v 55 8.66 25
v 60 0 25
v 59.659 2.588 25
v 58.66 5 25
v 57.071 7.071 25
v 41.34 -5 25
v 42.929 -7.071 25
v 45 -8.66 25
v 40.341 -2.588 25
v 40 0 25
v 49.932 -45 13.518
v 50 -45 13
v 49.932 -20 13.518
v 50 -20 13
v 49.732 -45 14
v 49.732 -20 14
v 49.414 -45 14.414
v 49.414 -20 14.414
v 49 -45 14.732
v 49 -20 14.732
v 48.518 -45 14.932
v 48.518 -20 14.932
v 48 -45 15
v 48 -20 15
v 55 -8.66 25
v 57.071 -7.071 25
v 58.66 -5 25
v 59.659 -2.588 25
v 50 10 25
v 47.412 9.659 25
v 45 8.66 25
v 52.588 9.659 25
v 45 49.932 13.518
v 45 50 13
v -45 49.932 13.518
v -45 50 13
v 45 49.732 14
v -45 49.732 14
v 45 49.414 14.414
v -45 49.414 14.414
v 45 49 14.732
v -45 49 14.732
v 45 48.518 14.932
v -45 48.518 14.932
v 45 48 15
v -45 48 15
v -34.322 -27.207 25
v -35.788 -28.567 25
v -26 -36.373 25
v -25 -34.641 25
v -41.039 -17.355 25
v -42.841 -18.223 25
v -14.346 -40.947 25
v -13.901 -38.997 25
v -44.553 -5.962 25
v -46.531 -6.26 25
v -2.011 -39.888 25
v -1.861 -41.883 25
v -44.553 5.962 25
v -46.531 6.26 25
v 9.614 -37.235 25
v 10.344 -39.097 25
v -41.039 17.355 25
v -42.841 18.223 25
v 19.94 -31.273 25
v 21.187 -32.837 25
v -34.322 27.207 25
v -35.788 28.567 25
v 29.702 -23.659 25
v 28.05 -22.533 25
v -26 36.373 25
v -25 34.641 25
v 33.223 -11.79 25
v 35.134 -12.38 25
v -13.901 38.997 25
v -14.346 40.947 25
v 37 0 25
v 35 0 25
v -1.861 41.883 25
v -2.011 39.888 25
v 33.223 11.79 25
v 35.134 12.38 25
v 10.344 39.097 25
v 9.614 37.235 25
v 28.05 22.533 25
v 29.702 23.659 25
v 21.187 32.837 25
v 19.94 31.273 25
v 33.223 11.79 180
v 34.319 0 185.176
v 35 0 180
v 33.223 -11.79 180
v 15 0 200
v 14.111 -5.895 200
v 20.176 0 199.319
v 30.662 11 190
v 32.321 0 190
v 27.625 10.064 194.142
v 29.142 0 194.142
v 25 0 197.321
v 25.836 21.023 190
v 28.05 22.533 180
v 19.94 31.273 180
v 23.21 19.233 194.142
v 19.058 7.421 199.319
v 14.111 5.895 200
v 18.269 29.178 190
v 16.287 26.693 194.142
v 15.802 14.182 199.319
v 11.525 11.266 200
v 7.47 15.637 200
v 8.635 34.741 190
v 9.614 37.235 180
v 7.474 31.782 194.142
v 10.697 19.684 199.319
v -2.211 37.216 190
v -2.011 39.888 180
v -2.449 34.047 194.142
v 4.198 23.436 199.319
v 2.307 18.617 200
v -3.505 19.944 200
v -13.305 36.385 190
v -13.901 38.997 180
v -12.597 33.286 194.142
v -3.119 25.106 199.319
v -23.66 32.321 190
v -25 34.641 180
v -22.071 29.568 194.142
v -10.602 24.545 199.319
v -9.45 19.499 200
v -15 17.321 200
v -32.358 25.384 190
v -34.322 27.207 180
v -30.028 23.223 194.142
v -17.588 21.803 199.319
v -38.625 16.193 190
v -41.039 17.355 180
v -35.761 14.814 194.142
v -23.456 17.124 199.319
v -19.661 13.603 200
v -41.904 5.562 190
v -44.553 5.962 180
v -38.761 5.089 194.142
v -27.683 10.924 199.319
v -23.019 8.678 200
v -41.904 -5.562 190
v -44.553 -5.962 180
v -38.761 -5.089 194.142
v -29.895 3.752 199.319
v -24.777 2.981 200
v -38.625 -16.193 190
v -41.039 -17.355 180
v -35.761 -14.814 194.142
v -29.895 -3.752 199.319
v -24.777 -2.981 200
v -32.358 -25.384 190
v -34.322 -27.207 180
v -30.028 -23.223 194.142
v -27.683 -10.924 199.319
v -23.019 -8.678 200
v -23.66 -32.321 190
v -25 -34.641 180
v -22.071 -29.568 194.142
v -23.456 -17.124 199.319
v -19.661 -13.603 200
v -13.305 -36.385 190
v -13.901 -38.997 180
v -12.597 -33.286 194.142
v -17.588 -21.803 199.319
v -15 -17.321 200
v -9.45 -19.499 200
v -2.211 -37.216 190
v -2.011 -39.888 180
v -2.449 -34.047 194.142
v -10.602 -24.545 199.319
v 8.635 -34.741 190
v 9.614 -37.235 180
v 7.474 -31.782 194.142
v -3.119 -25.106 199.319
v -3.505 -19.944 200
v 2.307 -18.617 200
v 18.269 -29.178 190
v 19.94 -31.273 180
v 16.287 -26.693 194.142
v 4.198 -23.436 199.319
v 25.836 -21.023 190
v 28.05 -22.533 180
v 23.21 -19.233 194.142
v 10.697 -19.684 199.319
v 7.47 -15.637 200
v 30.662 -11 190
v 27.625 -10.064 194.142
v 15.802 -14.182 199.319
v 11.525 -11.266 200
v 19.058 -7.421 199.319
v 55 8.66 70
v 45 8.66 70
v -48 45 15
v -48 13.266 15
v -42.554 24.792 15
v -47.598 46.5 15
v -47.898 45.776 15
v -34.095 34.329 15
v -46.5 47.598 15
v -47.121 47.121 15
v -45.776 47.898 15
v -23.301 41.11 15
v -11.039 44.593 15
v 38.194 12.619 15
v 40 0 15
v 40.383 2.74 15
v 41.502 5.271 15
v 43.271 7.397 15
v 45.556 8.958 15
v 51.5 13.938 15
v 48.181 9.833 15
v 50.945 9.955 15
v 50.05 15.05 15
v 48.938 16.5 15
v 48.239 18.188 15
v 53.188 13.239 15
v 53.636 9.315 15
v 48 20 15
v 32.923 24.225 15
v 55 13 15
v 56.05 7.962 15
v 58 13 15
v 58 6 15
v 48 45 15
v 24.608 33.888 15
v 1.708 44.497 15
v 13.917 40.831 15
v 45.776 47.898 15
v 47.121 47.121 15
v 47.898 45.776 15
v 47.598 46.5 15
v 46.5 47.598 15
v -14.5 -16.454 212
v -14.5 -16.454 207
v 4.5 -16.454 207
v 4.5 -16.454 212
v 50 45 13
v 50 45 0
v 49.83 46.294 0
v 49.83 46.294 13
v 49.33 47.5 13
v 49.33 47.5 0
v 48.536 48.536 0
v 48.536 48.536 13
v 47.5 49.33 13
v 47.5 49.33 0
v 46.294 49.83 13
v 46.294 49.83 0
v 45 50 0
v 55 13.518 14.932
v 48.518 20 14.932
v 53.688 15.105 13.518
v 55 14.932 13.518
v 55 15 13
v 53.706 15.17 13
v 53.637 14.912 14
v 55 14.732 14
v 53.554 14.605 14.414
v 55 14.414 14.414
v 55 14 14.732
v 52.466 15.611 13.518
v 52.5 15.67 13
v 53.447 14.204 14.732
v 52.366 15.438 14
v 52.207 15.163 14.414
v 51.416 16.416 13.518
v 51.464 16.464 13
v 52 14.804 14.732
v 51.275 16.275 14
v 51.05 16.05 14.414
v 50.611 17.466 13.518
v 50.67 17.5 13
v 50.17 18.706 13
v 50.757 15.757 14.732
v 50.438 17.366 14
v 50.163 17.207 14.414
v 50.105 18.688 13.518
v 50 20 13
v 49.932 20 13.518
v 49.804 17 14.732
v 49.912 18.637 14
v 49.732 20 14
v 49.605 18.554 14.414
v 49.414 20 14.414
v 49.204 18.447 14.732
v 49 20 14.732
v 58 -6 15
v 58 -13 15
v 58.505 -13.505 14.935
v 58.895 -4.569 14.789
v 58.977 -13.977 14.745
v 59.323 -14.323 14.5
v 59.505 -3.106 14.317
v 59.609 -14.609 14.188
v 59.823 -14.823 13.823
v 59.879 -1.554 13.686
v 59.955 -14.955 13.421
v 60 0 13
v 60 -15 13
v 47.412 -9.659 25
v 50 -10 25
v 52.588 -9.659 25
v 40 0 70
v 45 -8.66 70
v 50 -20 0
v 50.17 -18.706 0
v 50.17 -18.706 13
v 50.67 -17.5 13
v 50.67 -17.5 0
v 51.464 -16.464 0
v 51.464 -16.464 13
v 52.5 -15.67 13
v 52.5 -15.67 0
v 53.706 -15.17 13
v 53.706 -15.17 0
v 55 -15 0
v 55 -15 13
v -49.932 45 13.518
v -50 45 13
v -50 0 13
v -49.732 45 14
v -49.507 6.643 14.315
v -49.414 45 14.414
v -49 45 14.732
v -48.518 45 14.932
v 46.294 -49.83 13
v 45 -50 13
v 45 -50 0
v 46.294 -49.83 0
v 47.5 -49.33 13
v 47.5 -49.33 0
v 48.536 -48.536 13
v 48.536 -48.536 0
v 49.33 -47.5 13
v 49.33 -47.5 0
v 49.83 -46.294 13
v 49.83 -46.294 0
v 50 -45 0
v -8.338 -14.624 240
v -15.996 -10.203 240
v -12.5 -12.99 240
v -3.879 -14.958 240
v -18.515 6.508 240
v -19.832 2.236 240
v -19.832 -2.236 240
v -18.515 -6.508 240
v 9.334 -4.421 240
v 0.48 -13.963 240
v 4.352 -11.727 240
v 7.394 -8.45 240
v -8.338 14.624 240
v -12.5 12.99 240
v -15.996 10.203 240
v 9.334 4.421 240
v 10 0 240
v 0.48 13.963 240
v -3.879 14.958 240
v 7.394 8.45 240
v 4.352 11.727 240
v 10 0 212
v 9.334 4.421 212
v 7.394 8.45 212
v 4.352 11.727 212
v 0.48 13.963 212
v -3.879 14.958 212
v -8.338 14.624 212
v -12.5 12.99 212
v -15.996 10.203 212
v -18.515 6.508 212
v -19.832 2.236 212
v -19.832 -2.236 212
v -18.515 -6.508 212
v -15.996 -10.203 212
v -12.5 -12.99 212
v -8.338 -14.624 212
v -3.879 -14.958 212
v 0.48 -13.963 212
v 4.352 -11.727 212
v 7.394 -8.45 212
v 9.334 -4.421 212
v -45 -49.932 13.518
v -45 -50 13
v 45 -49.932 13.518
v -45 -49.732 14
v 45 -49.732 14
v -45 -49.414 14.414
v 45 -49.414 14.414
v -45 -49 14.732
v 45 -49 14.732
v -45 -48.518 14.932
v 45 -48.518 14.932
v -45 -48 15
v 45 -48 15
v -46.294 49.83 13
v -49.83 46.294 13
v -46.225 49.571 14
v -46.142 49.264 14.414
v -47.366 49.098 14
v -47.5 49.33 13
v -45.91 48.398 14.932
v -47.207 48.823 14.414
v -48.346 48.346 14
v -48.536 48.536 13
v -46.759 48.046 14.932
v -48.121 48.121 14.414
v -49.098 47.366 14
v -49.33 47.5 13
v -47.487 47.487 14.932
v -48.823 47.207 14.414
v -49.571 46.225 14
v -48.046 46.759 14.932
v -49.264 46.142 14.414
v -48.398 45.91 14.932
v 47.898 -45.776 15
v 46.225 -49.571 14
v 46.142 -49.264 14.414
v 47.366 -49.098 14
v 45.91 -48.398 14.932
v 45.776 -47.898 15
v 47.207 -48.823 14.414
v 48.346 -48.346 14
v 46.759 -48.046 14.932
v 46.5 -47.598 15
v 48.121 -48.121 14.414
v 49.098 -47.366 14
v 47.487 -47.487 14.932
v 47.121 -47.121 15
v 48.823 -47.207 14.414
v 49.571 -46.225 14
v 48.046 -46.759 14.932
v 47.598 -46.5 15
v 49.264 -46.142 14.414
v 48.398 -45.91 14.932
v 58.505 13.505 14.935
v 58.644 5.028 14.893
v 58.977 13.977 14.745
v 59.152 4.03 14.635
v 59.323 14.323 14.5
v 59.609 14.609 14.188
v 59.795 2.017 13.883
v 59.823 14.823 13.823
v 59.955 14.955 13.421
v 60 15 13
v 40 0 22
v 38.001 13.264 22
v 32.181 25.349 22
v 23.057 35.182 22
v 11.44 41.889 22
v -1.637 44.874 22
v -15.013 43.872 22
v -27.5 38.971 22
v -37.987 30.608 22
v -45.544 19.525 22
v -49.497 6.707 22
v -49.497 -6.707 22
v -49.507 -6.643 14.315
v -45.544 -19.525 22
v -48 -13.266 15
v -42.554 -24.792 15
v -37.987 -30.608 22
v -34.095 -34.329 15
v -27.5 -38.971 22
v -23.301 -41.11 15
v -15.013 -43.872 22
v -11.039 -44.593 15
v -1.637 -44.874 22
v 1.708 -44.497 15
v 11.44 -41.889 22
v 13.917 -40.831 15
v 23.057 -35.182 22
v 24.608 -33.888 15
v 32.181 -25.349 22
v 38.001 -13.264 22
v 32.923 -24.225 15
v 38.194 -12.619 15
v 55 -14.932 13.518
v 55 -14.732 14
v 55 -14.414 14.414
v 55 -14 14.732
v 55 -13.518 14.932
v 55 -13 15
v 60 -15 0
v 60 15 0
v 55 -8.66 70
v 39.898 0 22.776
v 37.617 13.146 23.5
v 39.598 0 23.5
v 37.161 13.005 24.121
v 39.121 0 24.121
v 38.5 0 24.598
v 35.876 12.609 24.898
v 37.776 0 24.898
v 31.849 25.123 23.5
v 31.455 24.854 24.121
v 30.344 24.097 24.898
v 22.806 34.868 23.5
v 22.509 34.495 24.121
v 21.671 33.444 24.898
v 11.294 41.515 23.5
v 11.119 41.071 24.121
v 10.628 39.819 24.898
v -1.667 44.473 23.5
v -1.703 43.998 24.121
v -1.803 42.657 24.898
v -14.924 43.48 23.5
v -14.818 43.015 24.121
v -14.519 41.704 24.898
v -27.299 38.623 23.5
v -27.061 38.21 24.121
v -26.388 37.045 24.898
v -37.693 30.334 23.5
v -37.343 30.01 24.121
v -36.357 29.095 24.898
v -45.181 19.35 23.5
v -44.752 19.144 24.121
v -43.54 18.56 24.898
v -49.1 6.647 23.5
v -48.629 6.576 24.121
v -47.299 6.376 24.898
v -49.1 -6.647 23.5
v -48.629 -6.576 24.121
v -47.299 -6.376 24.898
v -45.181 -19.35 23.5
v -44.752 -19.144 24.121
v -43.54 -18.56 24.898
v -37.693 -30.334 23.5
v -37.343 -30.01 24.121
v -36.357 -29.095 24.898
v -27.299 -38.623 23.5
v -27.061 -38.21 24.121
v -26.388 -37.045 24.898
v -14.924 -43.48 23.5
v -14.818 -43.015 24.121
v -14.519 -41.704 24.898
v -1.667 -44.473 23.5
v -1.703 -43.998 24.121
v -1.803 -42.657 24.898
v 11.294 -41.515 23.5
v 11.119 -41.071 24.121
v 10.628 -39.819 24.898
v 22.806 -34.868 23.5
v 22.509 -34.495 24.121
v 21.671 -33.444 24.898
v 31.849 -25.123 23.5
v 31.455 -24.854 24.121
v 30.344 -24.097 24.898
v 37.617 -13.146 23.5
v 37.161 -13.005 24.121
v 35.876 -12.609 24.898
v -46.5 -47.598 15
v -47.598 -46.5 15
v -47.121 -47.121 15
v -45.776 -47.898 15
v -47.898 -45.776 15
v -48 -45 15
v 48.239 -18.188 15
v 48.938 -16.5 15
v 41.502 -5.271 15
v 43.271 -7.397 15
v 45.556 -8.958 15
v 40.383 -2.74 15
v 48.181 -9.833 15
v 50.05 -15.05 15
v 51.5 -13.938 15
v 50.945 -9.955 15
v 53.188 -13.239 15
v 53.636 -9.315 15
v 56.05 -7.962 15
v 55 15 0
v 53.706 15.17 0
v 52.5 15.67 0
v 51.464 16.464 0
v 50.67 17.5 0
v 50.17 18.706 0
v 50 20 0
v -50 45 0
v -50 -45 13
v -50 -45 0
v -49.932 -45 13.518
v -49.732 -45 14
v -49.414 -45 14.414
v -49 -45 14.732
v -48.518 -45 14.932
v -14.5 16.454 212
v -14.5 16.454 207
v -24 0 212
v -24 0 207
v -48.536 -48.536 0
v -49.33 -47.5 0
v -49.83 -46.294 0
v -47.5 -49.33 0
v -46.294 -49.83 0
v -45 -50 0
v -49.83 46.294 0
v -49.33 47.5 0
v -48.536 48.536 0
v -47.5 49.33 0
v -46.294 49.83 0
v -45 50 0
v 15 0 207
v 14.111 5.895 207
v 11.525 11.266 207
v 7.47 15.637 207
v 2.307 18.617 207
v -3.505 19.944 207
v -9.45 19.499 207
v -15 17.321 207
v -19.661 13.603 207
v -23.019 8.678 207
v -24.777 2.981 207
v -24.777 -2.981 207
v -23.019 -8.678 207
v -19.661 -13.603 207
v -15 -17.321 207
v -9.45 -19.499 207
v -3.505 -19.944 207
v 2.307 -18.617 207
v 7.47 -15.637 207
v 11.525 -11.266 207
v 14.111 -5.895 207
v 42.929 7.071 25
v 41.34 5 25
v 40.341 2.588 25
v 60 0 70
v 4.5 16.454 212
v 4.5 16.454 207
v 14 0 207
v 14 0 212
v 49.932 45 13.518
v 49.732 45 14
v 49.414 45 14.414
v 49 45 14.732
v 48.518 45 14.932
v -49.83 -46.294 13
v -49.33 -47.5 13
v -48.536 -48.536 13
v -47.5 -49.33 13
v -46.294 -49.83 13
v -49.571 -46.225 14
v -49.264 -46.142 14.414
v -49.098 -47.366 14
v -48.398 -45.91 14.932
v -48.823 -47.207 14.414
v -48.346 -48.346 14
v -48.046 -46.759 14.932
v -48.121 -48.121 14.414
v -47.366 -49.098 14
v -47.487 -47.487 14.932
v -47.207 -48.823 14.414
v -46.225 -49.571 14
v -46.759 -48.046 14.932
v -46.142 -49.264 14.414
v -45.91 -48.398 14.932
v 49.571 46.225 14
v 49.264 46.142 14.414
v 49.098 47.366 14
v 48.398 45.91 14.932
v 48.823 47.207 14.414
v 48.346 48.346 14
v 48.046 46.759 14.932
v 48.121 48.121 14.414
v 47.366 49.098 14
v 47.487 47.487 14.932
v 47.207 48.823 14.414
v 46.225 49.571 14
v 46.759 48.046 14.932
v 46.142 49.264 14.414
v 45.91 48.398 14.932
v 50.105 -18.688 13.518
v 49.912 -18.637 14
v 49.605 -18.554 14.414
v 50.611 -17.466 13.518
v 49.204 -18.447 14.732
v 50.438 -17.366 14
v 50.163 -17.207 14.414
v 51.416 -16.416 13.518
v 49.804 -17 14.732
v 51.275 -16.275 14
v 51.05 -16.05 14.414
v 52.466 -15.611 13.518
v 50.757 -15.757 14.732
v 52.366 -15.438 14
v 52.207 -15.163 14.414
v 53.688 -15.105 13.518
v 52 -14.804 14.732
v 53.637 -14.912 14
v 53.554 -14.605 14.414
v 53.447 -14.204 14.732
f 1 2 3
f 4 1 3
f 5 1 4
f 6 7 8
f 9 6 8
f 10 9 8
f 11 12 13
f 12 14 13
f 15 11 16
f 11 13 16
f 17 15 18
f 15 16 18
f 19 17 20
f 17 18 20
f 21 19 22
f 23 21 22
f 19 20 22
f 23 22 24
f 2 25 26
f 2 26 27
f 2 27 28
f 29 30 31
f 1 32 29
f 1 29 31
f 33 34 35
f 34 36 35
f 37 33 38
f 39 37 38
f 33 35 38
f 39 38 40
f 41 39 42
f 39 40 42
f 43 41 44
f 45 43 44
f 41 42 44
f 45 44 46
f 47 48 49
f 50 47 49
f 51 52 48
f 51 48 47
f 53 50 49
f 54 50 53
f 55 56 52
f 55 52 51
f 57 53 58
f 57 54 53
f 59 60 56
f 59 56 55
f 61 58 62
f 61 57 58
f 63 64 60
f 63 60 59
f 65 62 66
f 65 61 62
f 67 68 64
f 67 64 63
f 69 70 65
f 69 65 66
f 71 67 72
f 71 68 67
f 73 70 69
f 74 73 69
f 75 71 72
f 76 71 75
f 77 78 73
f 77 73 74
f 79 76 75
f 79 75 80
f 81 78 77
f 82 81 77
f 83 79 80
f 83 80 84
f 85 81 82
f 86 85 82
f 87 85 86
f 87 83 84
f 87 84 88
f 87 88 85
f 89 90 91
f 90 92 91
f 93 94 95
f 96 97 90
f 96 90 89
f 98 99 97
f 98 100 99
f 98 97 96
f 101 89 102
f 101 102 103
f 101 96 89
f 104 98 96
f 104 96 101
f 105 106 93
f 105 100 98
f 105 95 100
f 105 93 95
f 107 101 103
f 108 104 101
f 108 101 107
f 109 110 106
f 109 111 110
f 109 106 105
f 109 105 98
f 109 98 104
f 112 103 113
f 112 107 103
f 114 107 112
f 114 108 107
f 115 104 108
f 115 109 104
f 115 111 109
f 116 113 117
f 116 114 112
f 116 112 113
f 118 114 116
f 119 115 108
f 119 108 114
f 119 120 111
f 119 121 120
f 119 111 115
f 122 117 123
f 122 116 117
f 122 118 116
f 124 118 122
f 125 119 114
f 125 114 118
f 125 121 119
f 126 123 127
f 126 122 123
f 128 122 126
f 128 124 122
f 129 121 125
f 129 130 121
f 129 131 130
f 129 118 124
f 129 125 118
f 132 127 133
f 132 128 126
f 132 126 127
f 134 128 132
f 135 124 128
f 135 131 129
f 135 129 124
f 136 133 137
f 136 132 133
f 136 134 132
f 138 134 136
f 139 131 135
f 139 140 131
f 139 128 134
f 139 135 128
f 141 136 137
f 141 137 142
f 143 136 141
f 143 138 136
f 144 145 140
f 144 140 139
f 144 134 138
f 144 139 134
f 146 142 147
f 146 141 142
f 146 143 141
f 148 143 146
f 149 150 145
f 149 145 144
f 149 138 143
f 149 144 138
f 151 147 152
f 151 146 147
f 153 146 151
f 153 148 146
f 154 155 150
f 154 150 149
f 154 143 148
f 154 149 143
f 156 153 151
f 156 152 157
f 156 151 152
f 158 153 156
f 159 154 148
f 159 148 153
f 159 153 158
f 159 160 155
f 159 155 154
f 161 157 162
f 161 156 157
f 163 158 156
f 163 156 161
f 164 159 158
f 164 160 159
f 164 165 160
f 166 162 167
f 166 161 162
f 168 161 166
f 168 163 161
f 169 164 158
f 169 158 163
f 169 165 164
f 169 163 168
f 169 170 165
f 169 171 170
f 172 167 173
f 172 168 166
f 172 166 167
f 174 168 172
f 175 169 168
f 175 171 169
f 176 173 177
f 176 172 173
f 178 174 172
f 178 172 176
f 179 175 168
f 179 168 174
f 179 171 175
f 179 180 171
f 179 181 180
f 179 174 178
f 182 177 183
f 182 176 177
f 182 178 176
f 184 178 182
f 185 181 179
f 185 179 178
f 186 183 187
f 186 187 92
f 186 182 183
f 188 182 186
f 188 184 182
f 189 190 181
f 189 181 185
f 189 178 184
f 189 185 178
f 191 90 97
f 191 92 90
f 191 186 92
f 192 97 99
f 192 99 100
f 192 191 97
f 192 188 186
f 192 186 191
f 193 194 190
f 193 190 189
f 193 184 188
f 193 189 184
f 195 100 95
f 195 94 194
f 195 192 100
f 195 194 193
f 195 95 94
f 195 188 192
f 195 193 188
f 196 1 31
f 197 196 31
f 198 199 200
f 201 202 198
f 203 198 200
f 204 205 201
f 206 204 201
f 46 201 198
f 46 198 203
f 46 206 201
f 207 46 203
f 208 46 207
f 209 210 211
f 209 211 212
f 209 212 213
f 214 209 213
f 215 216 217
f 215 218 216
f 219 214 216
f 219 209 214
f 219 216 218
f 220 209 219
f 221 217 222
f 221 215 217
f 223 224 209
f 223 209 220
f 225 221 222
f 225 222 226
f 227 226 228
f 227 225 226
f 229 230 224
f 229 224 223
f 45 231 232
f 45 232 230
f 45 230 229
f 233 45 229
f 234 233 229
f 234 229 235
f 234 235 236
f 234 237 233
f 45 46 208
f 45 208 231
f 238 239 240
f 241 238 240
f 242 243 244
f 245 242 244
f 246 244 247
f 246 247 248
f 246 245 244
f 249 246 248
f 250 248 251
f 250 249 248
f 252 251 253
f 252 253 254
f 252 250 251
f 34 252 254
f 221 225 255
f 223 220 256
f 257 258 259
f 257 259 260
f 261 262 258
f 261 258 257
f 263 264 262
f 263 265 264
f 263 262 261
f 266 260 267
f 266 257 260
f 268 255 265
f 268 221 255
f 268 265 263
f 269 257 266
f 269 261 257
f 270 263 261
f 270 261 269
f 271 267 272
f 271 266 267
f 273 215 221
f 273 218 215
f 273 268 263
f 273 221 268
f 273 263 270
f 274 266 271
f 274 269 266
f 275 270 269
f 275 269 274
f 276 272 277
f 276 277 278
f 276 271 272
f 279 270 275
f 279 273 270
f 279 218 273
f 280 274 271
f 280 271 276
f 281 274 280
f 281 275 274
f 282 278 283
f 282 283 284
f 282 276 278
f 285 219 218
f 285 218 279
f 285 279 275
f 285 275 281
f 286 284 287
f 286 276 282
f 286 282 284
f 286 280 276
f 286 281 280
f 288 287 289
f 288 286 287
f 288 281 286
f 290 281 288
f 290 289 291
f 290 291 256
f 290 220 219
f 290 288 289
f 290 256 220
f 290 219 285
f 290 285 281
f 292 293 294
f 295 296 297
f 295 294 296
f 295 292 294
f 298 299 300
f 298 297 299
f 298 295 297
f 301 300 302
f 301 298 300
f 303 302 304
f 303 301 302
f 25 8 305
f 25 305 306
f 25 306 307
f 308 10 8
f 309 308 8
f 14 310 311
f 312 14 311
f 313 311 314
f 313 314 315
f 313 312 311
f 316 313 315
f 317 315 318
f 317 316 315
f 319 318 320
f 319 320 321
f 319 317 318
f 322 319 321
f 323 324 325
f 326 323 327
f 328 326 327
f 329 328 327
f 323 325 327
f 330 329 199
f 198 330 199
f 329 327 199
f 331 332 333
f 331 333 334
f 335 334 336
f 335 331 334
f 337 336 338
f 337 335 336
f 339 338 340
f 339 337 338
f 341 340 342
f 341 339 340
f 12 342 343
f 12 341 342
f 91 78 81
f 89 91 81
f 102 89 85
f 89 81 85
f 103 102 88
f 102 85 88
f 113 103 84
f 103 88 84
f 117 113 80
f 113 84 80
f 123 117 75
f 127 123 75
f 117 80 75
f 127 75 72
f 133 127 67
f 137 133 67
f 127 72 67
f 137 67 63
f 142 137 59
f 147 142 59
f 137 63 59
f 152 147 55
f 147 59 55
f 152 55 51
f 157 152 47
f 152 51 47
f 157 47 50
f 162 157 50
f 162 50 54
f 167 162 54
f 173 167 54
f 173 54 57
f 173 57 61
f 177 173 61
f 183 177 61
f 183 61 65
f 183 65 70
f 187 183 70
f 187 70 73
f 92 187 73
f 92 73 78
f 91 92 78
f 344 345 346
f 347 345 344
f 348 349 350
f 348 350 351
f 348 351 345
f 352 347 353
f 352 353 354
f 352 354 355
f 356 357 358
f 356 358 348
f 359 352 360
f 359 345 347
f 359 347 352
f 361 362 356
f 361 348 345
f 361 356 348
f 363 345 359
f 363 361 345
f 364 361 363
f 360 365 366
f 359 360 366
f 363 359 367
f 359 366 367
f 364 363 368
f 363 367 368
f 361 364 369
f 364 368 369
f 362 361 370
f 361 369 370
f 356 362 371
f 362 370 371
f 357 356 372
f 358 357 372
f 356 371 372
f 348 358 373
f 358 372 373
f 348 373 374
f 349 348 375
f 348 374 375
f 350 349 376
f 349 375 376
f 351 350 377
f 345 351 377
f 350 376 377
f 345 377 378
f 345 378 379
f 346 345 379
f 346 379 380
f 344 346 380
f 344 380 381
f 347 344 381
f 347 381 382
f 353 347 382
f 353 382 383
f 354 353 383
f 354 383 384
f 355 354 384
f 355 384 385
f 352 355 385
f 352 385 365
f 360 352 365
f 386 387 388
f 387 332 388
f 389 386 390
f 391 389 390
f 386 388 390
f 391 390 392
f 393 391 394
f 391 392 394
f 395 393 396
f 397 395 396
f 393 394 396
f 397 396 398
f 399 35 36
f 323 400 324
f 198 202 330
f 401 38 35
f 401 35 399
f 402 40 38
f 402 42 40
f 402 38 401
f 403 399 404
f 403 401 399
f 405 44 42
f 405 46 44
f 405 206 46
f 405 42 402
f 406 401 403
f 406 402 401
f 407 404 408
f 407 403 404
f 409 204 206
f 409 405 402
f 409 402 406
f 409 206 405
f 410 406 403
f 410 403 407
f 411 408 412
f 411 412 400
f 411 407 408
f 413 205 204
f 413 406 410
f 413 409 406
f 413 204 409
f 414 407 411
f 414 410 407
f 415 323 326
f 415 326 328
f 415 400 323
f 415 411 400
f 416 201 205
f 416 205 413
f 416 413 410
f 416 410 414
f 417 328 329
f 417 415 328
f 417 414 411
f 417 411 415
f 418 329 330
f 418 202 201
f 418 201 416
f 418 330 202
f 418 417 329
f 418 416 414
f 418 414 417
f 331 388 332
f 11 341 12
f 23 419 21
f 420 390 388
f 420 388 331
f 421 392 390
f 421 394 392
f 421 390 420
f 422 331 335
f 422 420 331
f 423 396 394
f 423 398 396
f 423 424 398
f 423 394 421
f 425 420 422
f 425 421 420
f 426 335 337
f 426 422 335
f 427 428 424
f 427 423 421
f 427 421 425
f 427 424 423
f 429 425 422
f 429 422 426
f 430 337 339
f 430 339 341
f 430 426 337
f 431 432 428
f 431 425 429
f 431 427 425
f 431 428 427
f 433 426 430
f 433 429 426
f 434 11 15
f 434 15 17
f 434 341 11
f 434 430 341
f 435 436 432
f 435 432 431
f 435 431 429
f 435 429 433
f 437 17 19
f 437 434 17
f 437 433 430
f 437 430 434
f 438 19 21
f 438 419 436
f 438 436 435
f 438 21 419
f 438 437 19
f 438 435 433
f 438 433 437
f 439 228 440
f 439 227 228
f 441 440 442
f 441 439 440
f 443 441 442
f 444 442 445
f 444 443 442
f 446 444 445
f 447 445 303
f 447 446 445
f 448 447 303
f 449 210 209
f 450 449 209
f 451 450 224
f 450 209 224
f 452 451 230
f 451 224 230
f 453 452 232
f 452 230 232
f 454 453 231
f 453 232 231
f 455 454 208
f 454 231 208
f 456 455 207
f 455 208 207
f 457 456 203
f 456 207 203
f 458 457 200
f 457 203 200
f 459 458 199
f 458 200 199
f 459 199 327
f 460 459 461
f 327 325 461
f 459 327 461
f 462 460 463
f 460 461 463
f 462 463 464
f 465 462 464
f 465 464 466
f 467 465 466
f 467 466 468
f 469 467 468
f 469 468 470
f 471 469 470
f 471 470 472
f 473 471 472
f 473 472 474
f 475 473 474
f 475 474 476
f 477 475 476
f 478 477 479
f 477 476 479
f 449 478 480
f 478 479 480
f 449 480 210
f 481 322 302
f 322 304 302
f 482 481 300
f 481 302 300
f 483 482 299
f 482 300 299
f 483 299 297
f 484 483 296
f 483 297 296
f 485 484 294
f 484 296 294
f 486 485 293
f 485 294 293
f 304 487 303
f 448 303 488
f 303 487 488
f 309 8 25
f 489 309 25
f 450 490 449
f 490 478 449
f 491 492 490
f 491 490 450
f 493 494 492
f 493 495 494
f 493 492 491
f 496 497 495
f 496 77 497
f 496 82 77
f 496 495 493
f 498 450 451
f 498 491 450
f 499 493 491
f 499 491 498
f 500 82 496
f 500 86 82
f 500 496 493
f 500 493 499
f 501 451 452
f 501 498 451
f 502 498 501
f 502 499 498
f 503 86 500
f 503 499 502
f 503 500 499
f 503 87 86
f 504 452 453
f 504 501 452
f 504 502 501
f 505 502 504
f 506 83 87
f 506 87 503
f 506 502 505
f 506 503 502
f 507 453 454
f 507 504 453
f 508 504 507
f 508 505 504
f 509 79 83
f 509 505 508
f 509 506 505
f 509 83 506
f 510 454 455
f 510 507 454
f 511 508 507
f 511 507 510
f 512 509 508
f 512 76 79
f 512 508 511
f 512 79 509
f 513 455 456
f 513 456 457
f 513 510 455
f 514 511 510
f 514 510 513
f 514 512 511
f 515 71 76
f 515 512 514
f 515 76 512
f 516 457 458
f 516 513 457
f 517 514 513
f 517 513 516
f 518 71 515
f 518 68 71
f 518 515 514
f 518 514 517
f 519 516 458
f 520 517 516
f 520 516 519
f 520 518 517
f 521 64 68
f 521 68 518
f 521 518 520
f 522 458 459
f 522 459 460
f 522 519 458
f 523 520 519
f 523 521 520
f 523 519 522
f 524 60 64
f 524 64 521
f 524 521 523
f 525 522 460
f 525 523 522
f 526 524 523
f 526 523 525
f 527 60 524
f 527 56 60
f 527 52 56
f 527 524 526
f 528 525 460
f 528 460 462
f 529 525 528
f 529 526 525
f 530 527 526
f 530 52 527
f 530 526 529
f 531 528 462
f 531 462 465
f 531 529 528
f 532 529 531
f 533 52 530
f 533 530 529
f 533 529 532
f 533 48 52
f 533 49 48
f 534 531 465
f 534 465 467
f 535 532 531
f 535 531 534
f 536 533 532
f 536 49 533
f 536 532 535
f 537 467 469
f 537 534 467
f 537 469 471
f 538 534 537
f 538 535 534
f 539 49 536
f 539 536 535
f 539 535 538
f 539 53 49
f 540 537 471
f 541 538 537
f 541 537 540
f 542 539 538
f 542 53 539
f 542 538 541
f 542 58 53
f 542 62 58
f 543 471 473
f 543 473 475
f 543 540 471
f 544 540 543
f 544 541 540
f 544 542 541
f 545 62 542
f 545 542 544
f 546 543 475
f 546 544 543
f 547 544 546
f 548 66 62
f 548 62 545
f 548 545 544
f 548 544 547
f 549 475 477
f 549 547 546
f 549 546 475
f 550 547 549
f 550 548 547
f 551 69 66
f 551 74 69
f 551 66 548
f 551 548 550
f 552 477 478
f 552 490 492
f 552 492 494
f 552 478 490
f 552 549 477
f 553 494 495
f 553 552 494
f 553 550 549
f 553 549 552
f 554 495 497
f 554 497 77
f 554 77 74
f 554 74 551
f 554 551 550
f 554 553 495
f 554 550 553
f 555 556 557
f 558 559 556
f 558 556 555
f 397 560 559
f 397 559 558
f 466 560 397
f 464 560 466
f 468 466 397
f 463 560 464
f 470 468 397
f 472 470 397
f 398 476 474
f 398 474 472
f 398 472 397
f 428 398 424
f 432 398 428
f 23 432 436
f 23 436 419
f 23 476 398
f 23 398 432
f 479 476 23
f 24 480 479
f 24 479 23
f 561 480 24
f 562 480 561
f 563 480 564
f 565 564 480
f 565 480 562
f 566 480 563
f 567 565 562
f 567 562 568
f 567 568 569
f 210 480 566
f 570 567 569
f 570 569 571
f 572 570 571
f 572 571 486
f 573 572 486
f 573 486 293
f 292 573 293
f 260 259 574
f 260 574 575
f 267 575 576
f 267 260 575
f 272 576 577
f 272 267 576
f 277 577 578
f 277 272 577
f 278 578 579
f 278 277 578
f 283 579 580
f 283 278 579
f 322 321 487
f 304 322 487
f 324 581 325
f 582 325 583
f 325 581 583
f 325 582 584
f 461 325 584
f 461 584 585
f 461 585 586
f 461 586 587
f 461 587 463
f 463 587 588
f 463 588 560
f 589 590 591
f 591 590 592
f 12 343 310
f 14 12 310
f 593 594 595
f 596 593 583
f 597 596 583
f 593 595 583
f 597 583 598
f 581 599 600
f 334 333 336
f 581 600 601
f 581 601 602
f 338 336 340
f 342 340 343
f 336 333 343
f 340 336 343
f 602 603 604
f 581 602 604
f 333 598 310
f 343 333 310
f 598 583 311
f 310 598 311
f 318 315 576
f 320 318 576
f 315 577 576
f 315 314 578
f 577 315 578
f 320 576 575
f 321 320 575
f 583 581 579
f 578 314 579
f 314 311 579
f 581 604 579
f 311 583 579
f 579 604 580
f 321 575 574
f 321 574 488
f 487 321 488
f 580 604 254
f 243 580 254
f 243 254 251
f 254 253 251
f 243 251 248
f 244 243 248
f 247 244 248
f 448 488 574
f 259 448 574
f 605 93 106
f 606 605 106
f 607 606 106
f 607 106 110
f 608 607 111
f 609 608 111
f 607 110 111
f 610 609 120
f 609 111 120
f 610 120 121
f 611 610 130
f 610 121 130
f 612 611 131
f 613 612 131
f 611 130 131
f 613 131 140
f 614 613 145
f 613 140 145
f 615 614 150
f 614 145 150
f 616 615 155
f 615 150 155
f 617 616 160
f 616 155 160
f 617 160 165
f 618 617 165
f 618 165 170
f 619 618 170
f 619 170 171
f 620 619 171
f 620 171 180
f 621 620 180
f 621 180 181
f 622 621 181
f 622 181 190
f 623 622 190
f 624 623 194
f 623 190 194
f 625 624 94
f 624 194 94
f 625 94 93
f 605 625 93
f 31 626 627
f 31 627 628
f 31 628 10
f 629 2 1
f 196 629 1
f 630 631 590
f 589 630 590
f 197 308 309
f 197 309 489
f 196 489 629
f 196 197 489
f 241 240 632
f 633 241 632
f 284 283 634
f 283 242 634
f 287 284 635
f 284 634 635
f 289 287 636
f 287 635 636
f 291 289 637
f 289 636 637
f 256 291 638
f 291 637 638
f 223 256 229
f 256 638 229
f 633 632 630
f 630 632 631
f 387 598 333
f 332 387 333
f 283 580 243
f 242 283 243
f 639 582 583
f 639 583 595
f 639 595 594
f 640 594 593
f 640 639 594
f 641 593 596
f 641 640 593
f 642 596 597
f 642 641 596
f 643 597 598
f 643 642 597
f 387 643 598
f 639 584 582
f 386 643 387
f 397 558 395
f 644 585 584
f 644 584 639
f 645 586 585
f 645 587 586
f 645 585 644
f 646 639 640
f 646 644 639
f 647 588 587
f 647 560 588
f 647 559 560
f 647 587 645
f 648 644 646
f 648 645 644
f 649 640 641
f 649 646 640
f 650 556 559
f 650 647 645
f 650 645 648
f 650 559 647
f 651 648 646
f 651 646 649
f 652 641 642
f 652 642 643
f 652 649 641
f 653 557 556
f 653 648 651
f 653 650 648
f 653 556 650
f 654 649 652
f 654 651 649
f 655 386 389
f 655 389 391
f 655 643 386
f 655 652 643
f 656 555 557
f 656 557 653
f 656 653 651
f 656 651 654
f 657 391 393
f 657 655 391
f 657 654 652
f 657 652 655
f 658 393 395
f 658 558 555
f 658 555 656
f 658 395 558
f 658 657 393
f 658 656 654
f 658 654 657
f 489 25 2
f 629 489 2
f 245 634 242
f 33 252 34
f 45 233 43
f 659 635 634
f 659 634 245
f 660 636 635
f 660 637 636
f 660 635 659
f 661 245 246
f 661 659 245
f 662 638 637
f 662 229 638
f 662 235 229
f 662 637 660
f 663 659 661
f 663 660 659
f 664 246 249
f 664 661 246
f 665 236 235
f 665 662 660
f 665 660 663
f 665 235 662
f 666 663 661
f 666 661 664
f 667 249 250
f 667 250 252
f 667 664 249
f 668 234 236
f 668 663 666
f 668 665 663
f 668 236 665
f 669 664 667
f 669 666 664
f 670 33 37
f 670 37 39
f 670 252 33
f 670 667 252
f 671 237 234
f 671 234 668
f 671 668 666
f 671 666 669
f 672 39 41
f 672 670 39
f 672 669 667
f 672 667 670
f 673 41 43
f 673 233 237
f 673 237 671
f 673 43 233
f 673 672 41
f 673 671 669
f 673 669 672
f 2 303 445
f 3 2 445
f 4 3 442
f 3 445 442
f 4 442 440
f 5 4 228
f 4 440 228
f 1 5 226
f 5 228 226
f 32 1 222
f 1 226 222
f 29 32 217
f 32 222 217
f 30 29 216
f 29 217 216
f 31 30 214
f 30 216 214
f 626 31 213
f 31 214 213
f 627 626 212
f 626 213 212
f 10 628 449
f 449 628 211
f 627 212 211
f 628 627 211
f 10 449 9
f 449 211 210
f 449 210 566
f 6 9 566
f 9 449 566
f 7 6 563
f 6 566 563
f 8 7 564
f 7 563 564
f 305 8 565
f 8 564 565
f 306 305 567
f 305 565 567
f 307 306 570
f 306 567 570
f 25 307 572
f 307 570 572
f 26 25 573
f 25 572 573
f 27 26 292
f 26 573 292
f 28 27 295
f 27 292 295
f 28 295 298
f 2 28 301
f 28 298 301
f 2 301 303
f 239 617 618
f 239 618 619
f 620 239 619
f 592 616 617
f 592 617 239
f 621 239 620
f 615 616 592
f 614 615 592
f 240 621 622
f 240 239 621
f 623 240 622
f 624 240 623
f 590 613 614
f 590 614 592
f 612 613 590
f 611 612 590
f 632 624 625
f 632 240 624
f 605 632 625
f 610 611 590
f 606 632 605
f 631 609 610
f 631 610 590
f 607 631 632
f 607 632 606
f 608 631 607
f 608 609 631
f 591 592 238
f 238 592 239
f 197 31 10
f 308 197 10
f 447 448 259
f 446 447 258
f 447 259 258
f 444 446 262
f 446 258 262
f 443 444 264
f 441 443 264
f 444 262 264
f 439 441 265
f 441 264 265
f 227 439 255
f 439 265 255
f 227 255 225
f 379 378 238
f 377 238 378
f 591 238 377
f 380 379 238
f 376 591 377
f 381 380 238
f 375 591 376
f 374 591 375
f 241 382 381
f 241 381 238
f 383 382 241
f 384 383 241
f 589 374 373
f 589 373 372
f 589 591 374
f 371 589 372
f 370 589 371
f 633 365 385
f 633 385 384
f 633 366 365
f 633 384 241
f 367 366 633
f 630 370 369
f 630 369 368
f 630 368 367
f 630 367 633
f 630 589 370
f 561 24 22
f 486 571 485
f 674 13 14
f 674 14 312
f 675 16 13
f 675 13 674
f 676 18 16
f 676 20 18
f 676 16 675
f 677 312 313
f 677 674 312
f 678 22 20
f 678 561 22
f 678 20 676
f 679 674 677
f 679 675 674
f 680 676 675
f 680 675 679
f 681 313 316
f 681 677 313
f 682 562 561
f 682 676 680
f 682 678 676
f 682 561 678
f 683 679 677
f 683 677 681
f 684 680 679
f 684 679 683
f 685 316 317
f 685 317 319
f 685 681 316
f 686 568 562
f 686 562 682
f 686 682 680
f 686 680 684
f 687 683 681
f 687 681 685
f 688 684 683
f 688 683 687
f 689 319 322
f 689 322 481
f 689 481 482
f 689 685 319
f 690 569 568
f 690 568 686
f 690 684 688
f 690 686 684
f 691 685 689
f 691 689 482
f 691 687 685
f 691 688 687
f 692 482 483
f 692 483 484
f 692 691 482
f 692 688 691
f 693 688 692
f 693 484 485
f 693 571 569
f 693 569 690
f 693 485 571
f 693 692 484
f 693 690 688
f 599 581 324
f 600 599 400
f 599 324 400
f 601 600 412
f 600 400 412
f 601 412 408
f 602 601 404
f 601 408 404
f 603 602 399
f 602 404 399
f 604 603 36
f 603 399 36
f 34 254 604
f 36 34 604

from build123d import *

# Parameters (mm, degrees)
PRISM_DEPTH       = 70
SKETCH001_R       = 10
EXTRUDE001_DEPTH  = 25
CYLINDER002_R     = 20
CYLINDER002_DEPTH = 7
PRISM001_DEPTH    = 12
CYLINDER001_R     = 45
CYLINDER001_DEPTH = 25
FILLET003_R       = 3
CYLINDER003_R     = 15
CYLINDER003_DEPTH = 150
EXTRUDE_DEPTH     = 15
FILLET_R          = 5
FILLET001_R       = 2
CYLINDER_R        = 40
CYLINDER_DEPTH    = 200
FILLET002_R       = 20


with BuildPart() as prisma:
    # Prism → Prism (new body)
    with BuildSketch(Plane(origin=(50, 0, 0), x_dir=(1, 0, 0), z_dir=(0, 0, 1))):
        Polygon((10, 0), (5, 8.660254), (-5, 8.660254), (-10, 0), (-5, -8.660254), (5, -8.660254), align=None)
    extrude(amount=PRISM_DEPTH)


with BuildPart() as fusion001:
    # Sketch001 → Extrude001 (new body)
    with BuildSketch(Plane.XY):
        with Locations((50, 0)):
            Circle(SKETCH001_R)
    extrude(amount=EXTRUDE001_DEPTH)

    # Fusion001: union Prisma
    add(prisma.part)


with BuildPart() as cilindro002:
    # Cylinder002 → Cylinder002 (new body)
    with BuildSketch(Plane(origin=(-5, 0, 200), x_dir=(1, 0, 0), z_dir=(0, 0, 1))):
        Circle(CYLINDER002_R)
    extrude(amount=CYLINDER002_DEPTH)


with BuildPart() as fusion004:
    # Prism001 → Prism001 (new body)
    with BuildSketch(Plane(origin=(-5, 0, 200), x_dir=(1, 0, 0), z_dir=(0, 0, 1))):
        Polygon((19, 0), (9.5, 16.454483), (-9.5, 16.454483), (-19, 0), (-9.5, -16.454483), (9.5, -16.454483), align=None)
    extrude(amount=PRISM001_DEPTH)

    # Fusion: union Cilindro002
    add(cilindro002.part)

    # Fusion004: union Fusion001
    add(fusion001.part)


with BuildPart() as fillet003:
    # Cylinder001 → Cylinder001 (new body)
    with BuildSketch(Plane(origin=(-5, 0, 0), x_dir=(1, 0, 0), z_dir=(0, 0, 1))):
        Circle(CYLINDER001_R)
    extrude(amount=CYLINDER001_DEPTH)

    # Fillet003
    fillet003_edges = [fillet003.edges().sort_by_distance(p)[0] for p in [
        (-50, 0, 25),
    ]]
    fillet(fillet003_edges, radius=FILLET003_R)


with BuildPart() as fusion003:
    # Cylinder003 → Cylinder003 (new body)
    with BuildSketch(Plane(origin=(-5, 0, 90), x_dir=(1, 0, 0), z_dir=(0, 0, 1))):
        Circle(CYLINDER003_R)
    extrude(amount=CYLINDER003_DEPTH)

    # Fusion003: union Fillet003
    add(fillet003.part)


with BuildPart() as fillet001:
    # Sketch → Extrude (new body)
    with BuildSketch(Plane.XY):
        Polygon((-50, 50), (-50, -50), (50, -50), (50, -15), (60, -15), (60, 15), (50, 15), (50, 50), align=None)
    extrude(amount=EXTRUDE_DEPTH)

    # Fillet
    fillet_edges = [fillet001.edges().sort_by_distance(p)[0] for p in [
        (-50, 50, 7.5),
        (-50, -50, 7.5),
        (50, -50, 7.5),
        (50, -15, 7.5),
        (50, 15, 7.5),
        (50, 50, 7.5),
    ]]
    fillet(fillet_edges, radius=FILLET_R)

    # Fillet001
    fillet001_edges = [fillet001.edges().sort_by_distance(p)[0] for p in [
        (-50, 0, 15),
        (-48.535534, 48.535534, 15),
        (-48.535534, -48.535534, 15),
        (0, 50, 15),
        (0, -50, 15),
        (48.535534, 48.535534, 15),
        (48.535534, -48.535534, 15),
        (50, 32.5, 15),
        (50, -32.5, 15),
        (51.464466, 16.464466, 15),
        (51.464466, -16.464466, 15),
        (57.5, 15, 15),
        (57.5, -15, 15),
        (60, 0, 15),
    ]]
    fillet(fillet001_edges, radius=FILLET001_R)


with BuildPart() as fusionadoto2:
    # Cylinder → Cylinder (new body)
    with BuildSketch(Plane(origin=(-5, 0, 0), x_dir=(1, 0, 0), z_dir=(0, 0, 1))):
        Circle(CYLINDER_R)
    extrude(amount=CYLINDER_DEPTH)

    # Fillet002
    fillet002_edges = [fusionadoto2.edges().sort_by_distance(p)[0] for p in [
        (-45, 0, 200),
    ]]
    fillet(fillet002_edges, radius=FILLET002_R)

    # Fusion002: union Fillet001
    add(fillet001.part)

    # Fusion005: union Fusion004, Fusion003
    add(fusion004.part)
    add(fusion003.part)


solid = fusionadoto2.part
